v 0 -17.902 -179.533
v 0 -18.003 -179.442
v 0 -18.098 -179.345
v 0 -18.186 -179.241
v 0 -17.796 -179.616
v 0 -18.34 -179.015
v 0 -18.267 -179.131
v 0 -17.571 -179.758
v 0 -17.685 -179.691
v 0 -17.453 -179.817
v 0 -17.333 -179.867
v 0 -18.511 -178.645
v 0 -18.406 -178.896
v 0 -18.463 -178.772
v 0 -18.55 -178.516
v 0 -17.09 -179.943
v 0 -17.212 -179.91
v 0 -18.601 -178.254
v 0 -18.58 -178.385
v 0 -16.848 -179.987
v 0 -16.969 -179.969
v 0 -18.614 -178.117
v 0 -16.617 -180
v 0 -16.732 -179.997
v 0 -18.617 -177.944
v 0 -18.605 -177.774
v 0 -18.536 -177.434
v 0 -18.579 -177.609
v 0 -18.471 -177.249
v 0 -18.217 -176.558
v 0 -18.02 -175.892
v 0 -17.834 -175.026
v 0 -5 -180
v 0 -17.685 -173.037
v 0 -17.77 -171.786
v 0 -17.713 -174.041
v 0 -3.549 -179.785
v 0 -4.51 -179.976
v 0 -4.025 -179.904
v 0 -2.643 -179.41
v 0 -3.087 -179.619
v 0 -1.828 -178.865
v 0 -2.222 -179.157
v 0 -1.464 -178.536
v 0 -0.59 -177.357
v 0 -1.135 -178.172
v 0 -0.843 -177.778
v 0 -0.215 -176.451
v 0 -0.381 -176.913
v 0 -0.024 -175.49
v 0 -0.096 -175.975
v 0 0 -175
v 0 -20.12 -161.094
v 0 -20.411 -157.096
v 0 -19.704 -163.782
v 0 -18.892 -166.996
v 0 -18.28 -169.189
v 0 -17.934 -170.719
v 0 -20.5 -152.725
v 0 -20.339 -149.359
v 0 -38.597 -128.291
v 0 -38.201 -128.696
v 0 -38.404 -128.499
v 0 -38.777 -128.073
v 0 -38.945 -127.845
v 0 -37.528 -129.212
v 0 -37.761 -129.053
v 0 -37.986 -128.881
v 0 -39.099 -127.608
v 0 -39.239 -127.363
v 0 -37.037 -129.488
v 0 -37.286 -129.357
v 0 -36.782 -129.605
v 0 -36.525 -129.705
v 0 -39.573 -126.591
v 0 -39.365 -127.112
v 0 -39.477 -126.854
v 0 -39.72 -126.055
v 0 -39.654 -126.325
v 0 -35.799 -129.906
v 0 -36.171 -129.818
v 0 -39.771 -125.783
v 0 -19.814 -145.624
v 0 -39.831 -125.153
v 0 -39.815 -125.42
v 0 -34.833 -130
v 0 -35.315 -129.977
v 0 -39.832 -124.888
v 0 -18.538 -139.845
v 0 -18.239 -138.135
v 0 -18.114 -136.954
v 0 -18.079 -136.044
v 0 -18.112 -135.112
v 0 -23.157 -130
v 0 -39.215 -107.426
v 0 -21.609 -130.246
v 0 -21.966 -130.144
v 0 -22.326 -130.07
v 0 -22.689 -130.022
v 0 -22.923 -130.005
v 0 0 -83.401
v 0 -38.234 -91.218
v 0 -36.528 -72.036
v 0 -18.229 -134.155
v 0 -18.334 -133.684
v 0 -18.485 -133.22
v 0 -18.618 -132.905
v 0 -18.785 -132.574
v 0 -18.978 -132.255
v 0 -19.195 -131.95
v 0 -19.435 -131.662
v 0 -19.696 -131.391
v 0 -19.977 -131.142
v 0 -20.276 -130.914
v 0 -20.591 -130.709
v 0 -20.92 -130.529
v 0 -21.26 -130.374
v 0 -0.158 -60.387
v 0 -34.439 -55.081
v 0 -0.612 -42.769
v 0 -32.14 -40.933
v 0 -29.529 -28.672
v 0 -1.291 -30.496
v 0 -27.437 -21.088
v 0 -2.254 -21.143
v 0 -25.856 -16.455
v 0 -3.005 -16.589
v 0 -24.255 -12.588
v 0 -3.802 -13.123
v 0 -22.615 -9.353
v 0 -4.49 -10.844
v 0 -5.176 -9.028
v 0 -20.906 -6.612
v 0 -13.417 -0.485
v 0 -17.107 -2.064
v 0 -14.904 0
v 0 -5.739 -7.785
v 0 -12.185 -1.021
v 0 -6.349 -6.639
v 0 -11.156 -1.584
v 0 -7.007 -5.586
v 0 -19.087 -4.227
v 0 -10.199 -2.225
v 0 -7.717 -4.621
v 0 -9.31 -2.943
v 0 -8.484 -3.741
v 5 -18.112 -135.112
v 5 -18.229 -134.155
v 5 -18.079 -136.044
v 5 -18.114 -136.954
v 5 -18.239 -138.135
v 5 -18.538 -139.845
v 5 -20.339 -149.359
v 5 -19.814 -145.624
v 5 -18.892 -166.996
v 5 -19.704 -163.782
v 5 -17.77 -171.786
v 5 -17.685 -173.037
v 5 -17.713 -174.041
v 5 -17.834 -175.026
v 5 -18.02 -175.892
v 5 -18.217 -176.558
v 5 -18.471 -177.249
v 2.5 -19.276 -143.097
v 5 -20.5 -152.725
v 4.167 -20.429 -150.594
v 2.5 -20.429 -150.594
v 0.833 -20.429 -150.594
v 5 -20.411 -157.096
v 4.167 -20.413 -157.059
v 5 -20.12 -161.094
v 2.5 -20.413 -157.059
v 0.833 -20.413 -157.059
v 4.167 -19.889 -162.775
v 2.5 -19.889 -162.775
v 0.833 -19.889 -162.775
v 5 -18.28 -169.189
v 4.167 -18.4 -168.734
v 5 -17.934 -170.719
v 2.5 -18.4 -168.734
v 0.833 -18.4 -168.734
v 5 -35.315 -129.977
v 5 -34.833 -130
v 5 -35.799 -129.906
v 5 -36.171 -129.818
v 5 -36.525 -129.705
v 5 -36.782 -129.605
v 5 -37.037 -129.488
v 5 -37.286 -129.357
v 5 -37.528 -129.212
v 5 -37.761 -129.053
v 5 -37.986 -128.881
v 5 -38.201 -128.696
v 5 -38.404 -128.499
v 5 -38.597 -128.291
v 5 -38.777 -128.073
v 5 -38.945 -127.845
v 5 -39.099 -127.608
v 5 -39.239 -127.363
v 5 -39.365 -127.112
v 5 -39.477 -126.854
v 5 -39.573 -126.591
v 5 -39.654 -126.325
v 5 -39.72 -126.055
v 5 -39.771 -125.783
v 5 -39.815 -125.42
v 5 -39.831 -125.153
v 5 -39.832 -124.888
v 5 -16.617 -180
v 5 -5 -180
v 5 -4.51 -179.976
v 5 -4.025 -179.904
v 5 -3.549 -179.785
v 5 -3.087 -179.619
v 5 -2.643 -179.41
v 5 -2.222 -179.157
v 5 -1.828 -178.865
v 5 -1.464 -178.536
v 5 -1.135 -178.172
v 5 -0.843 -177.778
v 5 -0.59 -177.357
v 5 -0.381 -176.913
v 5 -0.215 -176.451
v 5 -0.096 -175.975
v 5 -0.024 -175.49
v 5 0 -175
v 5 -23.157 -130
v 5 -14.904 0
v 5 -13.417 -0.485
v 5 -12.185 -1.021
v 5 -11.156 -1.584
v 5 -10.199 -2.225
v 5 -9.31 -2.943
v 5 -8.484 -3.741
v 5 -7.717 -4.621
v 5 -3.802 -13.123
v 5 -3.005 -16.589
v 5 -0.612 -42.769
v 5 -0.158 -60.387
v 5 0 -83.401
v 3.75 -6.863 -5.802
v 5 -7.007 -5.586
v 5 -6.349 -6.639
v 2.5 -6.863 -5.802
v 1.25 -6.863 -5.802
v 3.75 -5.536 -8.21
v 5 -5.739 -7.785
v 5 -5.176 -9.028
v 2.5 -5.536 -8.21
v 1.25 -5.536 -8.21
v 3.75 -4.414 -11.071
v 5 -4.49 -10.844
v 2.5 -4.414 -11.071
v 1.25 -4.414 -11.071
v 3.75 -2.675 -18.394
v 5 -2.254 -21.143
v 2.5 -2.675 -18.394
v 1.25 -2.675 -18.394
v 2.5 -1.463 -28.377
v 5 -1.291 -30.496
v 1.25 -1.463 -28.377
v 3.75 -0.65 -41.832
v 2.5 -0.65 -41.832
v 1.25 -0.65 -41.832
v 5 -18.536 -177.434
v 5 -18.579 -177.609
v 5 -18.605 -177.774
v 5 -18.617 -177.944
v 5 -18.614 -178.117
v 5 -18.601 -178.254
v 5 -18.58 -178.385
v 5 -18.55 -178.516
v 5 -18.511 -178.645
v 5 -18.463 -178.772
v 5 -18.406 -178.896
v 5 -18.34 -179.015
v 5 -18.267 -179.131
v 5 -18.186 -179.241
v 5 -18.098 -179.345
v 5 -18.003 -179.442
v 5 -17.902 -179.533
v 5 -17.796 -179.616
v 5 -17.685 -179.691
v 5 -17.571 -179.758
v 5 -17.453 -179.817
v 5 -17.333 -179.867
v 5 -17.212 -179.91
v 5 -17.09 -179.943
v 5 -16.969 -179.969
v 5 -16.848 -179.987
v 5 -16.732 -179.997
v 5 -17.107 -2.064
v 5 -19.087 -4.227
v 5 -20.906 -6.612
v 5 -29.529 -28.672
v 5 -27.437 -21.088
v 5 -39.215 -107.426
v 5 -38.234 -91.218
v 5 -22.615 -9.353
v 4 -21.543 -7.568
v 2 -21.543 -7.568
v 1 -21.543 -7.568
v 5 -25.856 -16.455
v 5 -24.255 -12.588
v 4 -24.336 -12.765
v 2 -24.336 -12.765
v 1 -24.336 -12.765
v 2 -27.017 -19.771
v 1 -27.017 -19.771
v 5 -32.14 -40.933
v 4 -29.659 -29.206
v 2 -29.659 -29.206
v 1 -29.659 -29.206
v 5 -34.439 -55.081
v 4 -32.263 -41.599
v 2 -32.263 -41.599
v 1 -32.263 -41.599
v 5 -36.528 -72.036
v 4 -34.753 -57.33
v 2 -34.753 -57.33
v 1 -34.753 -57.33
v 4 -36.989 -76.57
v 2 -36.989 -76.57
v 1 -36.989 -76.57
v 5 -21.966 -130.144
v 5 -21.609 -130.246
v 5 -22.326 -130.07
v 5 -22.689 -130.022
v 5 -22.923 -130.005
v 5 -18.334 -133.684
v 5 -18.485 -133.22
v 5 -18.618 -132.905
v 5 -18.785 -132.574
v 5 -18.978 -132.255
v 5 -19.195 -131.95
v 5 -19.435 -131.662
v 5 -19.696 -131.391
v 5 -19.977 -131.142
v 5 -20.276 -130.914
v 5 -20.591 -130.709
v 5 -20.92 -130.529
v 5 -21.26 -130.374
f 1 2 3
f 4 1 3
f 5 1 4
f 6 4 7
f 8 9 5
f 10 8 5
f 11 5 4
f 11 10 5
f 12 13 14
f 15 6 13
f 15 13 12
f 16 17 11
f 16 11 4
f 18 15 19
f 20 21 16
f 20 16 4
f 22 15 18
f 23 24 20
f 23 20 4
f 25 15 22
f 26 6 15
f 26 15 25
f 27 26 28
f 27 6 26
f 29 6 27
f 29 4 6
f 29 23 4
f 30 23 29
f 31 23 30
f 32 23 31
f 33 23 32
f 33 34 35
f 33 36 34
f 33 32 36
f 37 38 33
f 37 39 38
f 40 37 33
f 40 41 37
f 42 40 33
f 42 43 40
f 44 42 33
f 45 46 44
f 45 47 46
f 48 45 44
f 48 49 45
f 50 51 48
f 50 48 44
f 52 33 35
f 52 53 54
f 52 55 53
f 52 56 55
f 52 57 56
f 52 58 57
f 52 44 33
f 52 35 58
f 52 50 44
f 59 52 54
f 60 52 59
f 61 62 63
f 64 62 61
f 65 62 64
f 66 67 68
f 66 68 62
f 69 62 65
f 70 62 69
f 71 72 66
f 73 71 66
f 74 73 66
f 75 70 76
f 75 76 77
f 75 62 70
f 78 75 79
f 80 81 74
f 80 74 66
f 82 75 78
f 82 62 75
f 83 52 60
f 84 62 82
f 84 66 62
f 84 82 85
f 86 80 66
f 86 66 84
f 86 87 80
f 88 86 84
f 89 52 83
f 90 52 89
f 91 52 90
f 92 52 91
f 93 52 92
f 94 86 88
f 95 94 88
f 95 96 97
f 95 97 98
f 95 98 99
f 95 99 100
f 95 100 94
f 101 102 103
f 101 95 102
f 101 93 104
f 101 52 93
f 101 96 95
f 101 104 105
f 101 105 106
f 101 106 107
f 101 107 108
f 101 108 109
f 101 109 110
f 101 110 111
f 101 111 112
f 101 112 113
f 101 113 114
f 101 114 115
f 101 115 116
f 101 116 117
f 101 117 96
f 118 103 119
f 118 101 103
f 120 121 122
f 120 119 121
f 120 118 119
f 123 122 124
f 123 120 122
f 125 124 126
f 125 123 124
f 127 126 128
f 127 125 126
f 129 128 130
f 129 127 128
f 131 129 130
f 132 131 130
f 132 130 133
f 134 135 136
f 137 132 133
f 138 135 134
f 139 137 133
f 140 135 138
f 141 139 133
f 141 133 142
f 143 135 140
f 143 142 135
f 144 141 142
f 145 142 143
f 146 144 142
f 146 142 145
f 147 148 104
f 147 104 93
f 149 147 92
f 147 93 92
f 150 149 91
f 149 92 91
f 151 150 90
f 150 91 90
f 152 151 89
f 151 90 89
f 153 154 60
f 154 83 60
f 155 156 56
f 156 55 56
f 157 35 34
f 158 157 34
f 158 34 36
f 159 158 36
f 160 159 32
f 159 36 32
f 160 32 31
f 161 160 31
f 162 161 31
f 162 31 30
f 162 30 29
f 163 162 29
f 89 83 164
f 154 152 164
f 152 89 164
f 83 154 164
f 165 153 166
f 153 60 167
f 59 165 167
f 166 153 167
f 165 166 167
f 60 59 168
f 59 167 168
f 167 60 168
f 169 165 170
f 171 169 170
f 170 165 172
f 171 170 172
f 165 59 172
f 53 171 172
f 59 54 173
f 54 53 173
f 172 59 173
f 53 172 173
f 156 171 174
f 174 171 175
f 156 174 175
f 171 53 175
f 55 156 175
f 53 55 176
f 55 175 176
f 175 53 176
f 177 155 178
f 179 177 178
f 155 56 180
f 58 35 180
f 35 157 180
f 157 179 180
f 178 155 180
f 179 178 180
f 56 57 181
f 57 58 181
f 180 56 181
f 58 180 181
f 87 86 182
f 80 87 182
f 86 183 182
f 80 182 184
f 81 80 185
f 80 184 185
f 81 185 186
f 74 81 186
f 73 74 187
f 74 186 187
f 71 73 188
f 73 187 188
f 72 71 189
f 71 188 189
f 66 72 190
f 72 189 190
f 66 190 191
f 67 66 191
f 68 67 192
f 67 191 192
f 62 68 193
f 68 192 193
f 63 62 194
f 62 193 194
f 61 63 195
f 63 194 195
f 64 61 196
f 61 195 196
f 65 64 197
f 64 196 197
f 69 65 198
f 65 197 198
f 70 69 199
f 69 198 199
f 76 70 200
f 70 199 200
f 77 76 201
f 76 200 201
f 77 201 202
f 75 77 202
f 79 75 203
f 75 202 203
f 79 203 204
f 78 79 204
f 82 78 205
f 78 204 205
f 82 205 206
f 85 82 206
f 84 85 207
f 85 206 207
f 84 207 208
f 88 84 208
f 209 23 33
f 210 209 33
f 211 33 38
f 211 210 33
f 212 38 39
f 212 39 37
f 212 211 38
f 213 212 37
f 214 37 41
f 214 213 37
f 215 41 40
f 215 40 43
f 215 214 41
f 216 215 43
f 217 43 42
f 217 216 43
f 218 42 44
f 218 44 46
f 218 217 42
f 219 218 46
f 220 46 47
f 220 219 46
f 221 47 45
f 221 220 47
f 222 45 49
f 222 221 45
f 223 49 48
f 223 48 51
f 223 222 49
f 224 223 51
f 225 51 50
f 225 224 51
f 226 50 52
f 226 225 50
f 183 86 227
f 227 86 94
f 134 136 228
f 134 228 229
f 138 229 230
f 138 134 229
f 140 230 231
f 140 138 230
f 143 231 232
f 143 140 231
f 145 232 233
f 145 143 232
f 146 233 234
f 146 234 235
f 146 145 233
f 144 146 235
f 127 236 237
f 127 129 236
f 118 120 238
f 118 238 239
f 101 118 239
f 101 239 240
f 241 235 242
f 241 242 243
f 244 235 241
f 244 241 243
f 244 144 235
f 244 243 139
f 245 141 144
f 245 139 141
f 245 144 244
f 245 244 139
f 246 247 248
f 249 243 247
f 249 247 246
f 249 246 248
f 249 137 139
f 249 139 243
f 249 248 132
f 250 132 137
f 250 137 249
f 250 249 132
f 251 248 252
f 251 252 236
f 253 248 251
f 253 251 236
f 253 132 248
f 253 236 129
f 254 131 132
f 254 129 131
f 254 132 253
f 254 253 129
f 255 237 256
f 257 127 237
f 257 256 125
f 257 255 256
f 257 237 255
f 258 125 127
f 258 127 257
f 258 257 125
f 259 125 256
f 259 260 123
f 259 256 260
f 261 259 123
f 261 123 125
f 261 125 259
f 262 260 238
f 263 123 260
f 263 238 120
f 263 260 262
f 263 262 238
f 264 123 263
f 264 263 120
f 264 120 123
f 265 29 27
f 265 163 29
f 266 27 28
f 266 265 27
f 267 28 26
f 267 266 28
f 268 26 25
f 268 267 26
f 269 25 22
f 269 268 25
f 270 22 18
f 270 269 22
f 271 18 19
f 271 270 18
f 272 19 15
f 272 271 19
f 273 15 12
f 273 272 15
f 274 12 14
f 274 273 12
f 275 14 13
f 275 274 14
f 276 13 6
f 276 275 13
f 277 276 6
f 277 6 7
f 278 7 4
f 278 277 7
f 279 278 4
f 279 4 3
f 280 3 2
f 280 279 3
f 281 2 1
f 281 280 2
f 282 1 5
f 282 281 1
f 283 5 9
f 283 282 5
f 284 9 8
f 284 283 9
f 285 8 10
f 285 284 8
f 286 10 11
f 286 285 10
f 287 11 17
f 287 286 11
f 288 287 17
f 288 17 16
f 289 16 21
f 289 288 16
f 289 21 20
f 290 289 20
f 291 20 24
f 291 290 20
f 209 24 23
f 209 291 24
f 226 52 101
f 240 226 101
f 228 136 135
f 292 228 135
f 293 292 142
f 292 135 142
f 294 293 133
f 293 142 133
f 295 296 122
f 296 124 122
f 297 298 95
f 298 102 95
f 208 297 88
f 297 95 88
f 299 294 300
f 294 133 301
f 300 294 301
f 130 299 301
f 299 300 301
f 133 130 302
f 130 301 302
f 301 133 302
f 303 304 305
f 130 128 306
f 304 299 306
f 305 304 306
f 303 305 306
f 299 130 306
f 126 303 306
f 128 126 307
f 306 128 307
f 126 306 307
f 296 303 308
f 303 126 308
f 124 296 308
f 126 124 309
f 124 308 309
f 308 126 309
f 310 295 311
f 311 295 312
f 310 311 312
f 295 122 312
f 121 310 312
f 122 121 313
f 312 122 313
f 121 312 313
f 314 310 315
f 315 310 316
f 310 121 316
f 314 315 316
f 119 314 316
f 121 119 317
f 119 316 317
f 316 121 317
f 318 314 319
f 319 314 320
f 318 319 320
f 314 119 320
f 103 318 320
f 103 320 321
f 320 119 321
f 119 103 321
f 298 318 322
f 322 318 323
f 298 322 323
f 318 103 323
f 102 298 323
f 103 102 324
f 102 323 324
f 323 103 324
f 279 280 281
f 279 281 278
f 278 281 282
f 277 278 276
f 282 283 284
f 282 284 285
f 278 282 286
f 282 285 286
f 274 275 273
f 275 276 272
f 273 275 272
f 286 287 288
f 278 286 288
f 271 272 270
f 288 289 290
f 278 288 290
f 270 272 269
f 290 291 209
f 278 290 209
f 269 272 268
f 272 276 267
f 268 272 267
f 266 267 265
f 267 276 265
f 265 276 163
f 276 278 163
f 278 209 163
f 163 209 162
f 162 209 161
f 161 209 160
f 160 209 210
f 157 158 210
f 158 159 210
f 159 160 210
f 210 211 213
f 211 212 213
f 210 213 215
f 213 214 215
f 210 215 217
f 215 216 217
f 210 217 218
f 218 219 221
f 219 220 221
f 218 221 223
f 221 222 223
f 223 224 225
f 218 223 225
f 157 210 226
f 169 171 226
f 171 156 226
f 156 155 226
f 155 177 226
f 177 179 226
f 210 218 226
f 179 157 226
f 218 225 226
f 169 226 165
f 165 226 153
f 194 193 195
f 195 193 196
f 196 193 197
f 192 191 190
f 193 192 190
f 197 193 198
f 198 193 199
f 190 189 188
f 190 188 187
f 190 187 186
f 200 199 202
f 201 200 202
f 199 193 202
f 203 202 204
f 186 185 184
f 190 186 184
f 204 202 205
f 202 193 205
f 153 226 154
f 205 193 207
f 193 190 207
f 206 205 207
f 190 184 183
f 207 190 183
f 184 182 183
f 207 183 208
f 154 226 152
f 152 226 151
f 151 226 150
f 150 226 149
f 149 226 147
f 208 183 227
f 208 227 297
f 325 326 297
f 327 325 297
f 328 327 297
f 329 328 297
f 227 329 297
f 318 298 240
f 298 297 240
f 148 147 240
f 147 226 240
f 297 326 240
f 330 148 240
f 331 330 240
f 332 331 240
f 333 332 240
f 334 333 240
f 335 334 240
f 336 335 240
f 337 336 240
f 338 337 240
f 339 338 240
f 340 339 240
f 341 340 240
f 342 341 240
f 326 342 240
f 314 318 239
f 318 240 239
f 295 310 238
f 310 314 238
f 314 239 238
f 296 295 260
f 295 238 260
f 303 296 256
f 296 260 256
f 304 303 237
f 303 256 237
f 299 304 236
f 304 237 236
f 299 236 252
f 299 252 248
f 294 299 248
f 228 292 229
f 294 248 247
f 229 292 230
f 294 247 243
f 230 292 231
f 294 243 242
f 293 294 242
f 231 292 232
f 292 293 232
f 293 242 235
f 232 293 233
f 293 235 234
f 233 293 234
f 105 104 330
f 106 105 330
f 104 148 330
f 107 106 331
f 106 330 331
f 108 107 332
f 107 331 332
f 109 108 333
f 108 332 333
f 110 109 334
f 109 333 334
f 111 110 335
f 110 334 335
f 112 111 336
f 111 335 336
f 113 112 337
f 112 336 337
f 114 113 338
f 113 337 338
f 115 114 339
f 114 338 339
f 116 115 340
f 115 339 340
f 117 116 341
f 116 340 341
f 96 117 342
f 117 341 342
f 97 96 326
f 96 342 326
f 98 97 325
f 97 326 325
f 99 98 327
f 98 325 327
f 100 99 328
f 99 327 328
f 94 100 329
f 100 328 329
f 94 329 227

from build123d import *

# Parameters (mm, degrees)
EXTRUDE_1_DEPTH = 5
FILLET_6_R      = 5
FILLET_7_R      = 2
FILLET_8_R      = 5


# Read off the part's stored shape, not the designer's step: 凸台-拉伸1
with BuildPart() as part:
    # 凸台-拉伸1 outline → 凸台-拉伸1 (new body)
    with BuildSketch(Plane(origin=(0, 0, 0), x_dir=(0, 0, -1), z_dir=(1, 0, 0))):
        with BuildLine():
            add(Edge.make_bspline(
                [(0, -14.903846424), (2.951295662, -4.14849373), (13.496276672, -1.883966721), (29.52909514, 0), (83.401333812, 0)],
                knots=[0, 0, 0, 0, 0, 1, 1, 1, 1, 1], degree=4))
            add(Edge.make_bspline(
                [(0, -14.903846424), (7.045609734, -22.926953025), (13.86614676, -26.583220196), (29.227640995, -32.621761678), (74.300319088, -39.100169059), (130, -39.92714285)],
                knots=[0, 0, 0, 0, 0, 0, 0.966542999, 0.966542999, 0.966542999, 0.966542999, 0.966542999, 0.966542999], degree=5))
            Line((130, -39.92714285), (130, -20))
            add(Edge.make_bspline(
                [(130, -20), (142.554964398, -11.053747082), (149.196912904, -34.934175524), (158.630756241, -5.373255264), (163.289648635, -33.936740498), (166.072200522, -10.144868391), (180, -20)],
                knots=[0, 0, 0, 0, 0, 0, 0, 1, 1, 1, 1, 1, 1, 1], degree=6))
            Line((180, -20), (180, 0))
            Line((180, 0), (83.401333812, 0))
        make_face()
    extrude(amount=EXTRUDE_1_DEPTH)

    # 圆角6
    fillet_6_edges = [part.edges().sort_by_distance(p)[0] for p in [
        (2.5, -20, -130),
    ]]
    fillet(fillet_6_edges, radius=FILLET_6_R)

    # 圆角7
    fillet_7_edges = [part.edges().sort_by_distance(p)[0] for p in [
        (2.5, -20, -180),
    ]]
    fillet(fillet_7_edges, radius=FILLET_7_R)

    # 圆角8
    fillet_8_edges = [part.edges().sort_by_distance(p)[0] for p in [
        (2.5, 0, -180),
        (2.5, -39.92714285, -130),
    ]]
    fillet(fillet_8_edges, radius=FILLET_8_R)


solid = part.part
